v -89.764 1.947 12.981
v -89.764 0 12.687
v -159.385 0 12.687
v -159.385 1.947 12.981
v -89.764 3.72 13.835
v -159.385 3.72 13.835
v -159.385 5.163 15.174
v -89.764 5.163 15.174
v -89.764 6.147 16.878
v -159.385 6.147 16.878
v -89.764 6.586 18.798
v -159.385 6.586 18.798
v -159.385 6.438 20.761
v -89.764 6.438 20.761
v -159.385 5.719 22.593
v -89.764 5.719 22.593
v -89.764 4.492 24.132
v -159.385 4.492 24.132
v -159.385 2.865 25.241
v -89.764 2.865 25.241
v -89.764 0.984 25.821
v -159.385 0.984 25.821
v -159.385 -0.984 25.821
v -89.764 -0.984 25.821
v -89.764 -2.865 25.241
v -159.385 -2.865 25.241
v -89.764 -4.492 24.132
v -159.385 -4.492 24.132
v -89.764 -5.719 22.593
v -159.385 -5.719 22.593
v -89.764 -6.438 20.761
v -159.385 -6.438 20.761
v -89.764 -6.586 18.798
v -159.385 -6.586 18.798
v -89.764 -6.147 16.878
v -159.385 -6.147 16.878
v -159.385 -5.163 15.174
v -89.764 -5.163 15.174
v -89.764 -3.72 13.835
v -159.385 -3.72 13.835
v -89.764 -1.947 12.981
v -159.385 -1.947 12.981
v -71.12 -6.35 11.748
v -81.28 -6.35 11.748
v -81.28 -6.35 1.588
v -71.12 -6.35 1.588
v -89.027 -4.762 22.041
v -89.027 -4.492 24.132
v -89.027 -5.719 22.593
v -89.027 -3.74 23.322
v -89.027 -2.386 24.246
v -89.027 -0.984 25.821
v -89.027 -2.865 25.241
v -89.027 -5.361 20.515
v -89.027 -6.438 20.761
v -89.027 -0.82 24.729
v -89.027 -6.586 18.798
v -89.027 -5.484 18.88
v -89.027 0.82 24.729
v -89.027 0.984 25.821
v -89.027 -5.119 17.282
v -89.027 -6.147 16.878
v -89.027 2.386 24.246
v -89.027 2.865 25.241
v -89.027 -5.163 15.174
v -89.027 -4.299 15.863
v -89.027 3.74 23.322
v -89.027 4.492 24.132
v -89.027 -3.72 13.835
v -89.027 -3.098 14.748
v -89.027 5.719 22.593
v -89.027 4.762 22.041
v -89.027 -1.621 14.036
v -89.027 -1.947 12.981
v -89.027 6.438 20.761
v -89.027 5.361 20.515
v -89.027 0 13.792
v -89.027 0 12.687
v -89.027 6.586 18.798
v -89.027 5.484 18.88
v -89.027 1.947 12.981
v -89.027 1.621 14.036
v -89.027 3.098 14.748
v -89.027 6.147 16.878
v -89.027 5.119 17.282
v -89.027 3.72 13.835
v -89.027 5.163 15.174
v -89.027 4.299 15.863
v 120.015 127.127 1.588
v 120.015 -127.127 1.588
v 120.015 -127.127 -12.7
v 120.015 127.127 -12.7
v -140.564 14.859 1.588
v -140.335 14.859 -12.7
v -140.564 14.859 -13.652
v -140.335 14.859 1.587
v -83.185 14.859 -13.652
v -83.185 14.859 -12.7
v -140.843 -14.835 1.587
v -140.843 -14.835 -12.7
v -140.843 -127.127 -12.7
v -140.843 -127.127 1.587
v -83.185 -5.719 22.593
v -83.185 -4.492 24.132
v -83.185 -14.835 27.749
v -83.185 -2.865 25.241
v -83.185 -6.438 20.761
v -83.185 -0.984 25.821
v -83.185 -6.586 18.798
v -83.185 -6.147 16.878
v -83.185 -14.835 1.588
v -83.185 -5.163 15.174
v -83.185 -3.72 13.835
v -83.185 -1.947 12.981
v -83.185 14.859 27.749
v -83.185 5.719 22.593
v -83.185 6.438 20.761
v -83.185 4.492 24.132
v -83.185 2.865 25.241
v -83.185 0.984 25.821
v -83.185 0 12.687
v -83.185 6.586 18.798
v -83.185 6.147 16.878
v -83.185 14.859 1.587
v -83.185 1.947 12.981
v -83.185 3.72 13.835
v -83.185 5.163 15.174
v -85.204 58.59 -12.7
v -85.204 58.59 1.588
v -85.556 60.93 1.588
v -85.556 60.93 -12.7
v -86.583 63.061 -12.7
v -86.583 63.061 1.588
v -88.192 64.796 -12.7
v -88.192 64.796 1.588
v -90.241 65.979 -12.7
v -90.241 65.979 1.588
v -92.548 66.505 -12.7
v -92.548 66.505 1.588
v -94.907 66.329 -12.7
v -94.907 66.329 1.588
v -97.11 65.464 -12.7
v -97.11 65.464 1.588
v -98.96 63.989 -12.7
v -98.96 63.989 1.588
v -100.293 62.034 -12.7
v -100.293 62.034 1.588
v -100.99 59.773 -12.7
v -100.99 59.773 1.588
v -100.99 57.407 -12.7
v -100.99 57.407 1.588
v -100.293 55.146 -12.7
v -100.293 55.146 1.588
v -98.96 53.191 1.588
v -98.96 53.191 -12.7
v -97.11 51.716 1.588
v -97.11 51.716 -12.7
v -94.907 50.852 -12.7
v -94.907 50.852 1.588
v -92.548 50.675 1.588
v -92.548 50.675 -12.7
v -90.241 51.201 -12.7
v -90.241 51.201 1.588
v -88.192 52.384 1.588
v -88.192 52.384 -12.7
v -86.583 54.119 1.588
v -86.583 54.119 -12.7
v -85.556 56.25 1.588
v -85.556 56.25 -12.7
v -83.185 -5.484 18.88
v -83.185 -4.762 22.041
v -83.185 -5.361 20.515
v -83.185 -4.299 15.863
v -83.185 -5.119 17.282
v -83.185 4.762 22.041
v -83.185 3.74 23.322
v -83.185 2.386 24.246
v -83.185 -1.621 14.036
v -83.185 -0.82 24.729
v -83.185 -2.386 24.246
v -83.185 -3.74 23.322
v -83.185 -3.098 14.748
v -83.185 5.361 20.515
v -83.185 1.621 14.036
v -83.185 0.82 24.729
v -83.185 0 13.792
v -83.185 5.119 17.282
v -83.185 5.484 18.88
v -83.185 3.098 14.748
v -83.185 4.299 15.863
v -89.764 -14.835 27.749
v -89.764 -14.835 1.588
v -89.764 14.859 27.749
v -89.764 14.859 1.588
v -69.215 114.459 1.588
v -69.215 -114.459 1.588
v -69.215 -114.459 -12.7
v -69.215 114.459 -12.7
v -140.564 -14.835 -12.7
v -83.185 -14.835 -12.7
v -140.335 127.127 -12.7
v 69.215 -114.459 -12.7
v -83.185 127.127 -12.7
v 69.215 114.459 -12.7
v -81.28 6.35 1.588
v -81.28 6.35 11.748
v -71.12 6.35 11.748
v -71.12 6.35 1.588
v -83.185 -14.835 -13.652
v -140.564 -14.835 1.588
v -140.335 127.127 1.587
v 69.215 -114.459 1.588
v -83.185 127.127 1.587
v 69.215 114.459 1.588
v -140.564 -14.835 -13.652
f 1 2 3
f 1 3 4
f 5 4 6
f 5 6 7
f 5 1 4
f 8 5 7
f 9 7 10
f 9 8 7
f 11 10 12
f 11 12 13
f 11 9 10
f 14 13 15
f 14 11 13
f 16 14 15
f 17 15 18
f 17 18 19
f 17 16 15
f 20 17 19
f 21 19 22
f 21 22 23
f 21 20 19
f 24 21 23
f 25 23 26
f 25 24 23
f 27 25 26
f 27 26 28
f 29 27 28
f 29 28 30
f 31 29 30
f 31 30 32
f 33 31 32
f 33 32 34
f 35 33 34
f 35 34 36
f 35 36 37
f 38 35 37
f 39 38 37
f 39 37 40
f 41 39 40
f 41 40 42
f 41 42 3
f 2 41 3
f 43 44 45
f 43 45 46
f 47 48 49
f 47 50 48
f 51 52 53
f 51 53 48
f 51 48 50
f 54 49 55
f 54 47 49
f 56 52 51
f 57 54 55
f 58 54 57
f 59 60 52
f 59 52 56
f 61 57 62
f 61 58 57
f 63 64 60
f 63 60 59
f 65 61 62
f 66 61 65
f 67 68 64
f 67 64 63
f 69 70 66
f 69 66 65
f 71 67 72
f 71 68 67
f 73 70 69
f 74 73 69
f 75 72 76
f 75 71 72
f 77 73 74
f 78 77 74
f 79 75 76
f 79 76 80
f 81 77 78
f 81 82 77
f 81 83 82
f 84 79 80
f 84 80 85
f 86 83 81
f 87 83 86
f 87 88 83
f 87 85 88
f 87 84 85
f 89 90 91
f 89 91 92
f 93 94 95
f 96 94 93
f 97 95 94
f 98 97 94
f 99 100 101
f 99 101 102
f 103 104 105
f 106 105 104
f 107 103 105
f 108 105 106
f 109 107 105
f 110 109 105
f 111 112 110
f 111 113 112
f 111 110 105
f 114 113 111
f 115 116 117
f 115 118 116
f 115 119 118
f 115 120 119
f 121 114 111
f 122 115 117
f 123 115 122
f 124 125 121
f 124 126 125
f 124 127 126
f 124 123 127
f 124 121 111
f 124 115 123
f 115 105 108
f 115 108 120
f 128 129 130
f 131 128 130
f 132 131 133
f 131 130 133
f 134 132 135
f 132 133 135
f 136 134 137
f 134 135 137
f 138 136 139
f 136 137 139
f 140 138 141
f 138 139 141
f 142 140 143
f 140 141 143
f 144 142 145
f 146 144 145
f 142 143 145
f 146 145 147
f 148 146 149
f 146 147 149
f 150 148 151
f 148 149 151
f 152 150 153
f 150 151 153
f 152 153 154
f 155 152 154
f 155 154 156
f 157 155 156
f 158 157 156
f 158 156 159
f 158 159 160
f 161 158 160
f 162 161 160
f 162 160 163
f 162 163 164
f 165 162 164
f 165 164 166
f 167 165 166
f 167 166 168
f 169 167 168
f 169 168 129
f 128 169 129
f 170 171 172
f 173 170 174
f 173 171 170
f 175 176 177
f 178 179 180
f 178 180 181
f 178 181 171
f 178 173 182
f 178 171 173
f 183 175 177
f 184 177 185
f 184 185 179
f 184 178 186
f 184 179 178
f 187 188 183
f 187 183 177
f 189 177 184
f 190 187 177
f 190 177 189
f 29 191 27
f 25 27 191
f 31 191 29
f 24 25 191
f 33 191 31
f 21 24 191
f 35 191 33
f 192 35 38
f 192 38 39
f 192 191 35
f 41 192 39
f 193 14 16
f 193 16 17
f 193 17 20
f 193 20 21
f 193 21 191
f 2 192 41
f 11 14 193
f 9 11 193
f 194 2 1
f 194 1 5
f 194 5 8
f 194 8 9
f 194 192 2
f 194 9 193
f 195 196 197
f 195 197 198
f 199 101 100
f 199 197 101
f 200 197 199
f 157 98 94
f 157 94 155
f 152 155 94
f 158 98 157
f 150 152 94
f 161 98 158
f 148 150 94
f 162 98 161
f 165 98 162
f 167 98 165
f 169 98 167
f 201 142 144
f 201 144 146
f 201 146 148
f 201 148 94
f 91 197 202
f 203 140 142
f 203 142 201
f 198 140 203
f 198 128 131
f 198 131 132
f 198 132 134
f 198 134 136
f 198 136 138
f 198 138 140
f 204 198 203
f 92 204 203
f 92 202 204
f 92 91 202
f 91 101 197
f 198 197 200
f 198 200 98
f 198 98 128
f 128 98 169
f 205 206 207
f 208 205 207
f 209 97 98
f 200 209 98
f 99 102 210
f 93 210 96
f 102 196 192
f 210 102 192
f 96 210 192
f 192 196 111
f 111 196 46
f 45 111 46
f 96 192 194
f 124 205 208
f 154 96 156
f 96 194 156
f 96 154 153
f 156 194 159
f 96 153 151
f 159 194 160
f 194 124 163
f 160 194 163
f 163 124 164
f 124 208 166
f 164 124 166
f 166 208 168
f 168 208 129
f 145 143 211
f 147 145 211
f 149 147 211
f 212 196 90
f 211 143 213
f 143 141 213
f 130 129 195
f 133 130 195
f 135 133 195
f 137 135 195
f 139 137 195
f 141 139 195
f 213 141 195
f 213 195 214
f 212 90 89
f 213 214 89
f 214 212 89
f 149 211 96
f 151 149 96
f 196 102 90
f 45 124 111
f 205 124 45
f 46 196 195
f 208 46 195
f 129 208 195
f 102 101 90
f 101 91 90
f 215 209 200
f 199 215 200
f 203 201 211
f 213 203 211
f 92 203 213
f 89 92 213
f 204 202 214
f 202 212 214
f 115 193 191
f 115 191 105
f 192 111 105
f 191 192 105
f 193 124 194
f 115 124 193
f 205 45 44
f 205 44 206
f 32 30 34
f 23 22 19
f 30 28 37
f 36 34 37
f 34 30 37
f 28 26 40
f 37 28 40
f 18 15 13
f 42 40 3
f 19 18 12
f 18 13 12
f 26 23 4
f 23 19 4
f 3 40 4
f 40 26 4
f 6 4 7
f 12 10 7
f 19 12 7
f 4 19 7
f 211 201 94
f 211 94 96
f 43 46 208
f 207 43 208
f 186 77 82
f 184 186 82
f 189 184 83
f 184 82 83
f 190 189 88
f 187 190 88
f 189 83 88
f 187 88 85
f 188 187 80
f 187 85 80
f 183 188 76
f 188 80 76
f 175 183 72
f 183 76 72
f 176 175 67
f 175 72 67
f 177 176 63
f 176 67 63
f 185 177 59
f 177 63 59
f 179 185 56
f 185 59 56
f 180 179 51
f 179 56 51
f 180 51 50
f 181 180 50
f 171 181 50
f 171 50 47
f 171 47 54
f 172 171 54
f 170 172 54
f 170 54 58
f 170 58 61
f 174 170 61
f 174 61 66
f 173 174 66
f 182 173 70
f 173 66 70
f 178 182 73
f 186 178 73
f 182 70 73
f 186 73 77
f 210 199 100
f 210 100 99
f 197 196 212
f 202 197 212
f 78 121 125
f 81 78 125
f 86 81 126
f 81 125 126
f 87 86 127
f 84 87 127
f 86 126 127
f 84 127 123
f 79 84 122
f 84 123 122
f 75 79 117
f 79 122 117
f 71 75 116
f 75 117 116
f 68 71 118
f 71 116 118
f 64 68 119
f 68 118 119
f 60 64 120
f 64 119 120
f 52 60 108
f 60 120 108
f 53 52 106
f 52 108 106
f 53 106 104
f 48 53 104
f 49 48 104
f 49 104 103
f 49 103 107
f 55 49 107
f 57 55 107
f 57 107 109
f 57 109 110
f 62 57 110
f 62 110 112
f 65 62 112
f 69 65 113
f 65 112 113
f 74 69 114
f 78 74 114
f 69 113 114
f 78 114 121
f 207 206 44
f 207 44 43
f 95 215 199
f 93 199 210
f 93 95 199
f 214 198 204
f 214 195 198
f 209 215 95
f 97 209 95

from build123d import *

# Parameters (mm, degrees)
SKETCH1_W                = 203.2
SKETCH1_H                = 254.254
SKETCH1_W_2              = 138.43
SKETCH1_H_2              = 228.9175
BOSS_EXTRUDE1_DEPTH      = 1.5875
BOSS_EXTRUDE1_DEPTH_BACK = 12.7
SKETCH2_W                = 10.16
SKETCH2_H                = 12.7
BOSS_EXTRUDE2_DEPTH      = 10.16
SKETCH3_W                = 15.24
SKETCH3_H                = 29.693732077
BOSS_EXTRUDE3_DEPTH      = 6.578885717
SKETCH5_W                = 6.578885717
SKETCH5_H                = 29.693732077
BOSS_EXTRUDE4_DEPTH      = 26.162
SKETCH6_R                = 6.604
BOSS_EXTRUDE6_DEPTH      = 76.2
SKETCH11_R               = 6.604
CUT_EXTRUDE3_DEPTH       = 5.842
SKETCH13_R               = 5.4991
BOSS_EXTRUDE7_DEPTH      = 5.842
SKETCH15_W               = 15.24
SKETCH15_H               = 29.693732077
BOSS_EXTRUDE8_DEPTH      = 50.8
SKETCH16_W               = 14.2875
SKETCH16_H               = 112.267770999
BOSS_EXTRUDE9_DEPTH      = 57.15
SKETCH17_W               = 14.2875
SKETCH17_H               = 112.292496924
BOSS_EXTRUDE10_DEPTH     = 57.658
SKETCH18_R               = 7.9375
CUT_EXTRUDE4_DEPTH       = 57.658


with BuildPart() as part:
    # Sketch1 → Boss-Extrude1 (new body, two sides)
    with BuildSketch(Plane.XY) as boss_extrude1_sk:
        with Locations((18.415, 0)):
            Rectangle(SKETCH1_W, SKETCH1_H)
        Rectangle(SKETCH1_W_2, SKETCH1_H_2, mode=Mode.SUBTRACT)
    extrude(amount=BOSS_EXTRUDE1_DEPTH)
    extrude(boss_extrude1_sk.sketch, amount=-BOSS_EXTRUDE1_DEPTH_BACK)

    # Sketch2 → Boss-Extrude2 (add)
    with BuildSketch(Plane.XY.offset(1.5875)):
        with Locations((-76.2, 0)):
            Rectangle(SKETCH2_W, SKETCH2_H)
    extrude(amount=BOSS_EXTRUDE2_DEPTH)

    # Sketch3 → Boss-Extrude3 (add)
    with BuildSketch(Plane.ZY.offset(83.185)):
        with Locations((-6.0325, 0.012362963)):
            Rectangle(SKETCH3_W, SKETCH3_H)
    extrude(amount=BOSS_EXTRUDE3_DEPTH)

    # Sketch5 → Boss-Extrude4 (add)
    with BuildSketch(Plane.XY.offset(1.5875)):
        with Locations((-86.474442858, 0.012362963)):
            Rectangle(SKETCH5_W, SKETCH5_H)
    extrude(amount=BOSS_EXTRUDE4_DEPTH)

    # Sketch6 → Boss-Extrude6 (add)
    with BuildSketch(Plane(origin=(-83.185, 0, 0), x_dir=(0, 0, -1), z_dir=(1, 0, 0))):
        with Locations((-19.291204972, 0)):
            Circle(SKETCH6_R)
    extrude(amount=-BOSS_EXTRUDE6_DEPTH)

    # Sketch11 → Cut-Extrude3 (cut)
    with BuildSketch(Plane(origin=(-83.185, 0, 0), x_dir=(0, 0, -1), z_dir=(1, 0, 0))):
        with Locations((-19.291204972, 0)):
            Circle(SKETCH11_R)
    extrude(amount=-CUT_EXTRUDE3_DEPTH, mode=Mode.SUBTRACT)

    # Sketch13 → Boss-Extrude7 (add)
    with BuildSketch(Plane(origin=(-89.027, 0, 0), x_dir=(0, 0, -1), z_dir=(1, 0, 0))):
        with Locations((-19.291204972, 0)):
            Circle(SKETCH13_R)
    extrude(amount=BOSS_EXTRUDE7_DEPTH)

    # Sketch15 → Boss-Extrude8 (add)
    with BuildSketch(Plane.ZY.offset(89.763885717)):
        with Locations((-6.0325, 0.012362963)):
            Rectangle(SKETCH15_W, SKETCH15_H)
    extrude(amount=BOSS_EXTRUDE8_DEPTH)

    # Sketch16 → Boss-Extrude9 (add)
    with BuildSketch(Plane.ZY.offset(83.185)):
        with Locations((-5.55625, 70.9931145)):
            Rectangle(SKETCH16_W, SKETCH16_H)
    extrude(amount=BOSS_EXTRUDE9_DEPTH)

    # Sketch17 → Boss-Extrude10 (add)
    with BuildSketch(Plane.ZY.offset(83.185)):
        with Locations((-5.55625, -70.980751538)):
            Rectangle(SKETCH17_W, SKETCH17_H)
    extrude(amount=BOSS_EXTRUDE10_DEPTH)

    # Sketch18 → Cut-Extrude4 (cut)
    with BuildSketch(Plane.XY.offset(1.5875)):
        with Locations((-93.141229835, 58.590088082)):
            Circle(SKETCH18_R)
    extrude(amount=-CUT_EXTRUDE4_DEPTH, mode=Mode.SUBTRACT)


solid = part.part
